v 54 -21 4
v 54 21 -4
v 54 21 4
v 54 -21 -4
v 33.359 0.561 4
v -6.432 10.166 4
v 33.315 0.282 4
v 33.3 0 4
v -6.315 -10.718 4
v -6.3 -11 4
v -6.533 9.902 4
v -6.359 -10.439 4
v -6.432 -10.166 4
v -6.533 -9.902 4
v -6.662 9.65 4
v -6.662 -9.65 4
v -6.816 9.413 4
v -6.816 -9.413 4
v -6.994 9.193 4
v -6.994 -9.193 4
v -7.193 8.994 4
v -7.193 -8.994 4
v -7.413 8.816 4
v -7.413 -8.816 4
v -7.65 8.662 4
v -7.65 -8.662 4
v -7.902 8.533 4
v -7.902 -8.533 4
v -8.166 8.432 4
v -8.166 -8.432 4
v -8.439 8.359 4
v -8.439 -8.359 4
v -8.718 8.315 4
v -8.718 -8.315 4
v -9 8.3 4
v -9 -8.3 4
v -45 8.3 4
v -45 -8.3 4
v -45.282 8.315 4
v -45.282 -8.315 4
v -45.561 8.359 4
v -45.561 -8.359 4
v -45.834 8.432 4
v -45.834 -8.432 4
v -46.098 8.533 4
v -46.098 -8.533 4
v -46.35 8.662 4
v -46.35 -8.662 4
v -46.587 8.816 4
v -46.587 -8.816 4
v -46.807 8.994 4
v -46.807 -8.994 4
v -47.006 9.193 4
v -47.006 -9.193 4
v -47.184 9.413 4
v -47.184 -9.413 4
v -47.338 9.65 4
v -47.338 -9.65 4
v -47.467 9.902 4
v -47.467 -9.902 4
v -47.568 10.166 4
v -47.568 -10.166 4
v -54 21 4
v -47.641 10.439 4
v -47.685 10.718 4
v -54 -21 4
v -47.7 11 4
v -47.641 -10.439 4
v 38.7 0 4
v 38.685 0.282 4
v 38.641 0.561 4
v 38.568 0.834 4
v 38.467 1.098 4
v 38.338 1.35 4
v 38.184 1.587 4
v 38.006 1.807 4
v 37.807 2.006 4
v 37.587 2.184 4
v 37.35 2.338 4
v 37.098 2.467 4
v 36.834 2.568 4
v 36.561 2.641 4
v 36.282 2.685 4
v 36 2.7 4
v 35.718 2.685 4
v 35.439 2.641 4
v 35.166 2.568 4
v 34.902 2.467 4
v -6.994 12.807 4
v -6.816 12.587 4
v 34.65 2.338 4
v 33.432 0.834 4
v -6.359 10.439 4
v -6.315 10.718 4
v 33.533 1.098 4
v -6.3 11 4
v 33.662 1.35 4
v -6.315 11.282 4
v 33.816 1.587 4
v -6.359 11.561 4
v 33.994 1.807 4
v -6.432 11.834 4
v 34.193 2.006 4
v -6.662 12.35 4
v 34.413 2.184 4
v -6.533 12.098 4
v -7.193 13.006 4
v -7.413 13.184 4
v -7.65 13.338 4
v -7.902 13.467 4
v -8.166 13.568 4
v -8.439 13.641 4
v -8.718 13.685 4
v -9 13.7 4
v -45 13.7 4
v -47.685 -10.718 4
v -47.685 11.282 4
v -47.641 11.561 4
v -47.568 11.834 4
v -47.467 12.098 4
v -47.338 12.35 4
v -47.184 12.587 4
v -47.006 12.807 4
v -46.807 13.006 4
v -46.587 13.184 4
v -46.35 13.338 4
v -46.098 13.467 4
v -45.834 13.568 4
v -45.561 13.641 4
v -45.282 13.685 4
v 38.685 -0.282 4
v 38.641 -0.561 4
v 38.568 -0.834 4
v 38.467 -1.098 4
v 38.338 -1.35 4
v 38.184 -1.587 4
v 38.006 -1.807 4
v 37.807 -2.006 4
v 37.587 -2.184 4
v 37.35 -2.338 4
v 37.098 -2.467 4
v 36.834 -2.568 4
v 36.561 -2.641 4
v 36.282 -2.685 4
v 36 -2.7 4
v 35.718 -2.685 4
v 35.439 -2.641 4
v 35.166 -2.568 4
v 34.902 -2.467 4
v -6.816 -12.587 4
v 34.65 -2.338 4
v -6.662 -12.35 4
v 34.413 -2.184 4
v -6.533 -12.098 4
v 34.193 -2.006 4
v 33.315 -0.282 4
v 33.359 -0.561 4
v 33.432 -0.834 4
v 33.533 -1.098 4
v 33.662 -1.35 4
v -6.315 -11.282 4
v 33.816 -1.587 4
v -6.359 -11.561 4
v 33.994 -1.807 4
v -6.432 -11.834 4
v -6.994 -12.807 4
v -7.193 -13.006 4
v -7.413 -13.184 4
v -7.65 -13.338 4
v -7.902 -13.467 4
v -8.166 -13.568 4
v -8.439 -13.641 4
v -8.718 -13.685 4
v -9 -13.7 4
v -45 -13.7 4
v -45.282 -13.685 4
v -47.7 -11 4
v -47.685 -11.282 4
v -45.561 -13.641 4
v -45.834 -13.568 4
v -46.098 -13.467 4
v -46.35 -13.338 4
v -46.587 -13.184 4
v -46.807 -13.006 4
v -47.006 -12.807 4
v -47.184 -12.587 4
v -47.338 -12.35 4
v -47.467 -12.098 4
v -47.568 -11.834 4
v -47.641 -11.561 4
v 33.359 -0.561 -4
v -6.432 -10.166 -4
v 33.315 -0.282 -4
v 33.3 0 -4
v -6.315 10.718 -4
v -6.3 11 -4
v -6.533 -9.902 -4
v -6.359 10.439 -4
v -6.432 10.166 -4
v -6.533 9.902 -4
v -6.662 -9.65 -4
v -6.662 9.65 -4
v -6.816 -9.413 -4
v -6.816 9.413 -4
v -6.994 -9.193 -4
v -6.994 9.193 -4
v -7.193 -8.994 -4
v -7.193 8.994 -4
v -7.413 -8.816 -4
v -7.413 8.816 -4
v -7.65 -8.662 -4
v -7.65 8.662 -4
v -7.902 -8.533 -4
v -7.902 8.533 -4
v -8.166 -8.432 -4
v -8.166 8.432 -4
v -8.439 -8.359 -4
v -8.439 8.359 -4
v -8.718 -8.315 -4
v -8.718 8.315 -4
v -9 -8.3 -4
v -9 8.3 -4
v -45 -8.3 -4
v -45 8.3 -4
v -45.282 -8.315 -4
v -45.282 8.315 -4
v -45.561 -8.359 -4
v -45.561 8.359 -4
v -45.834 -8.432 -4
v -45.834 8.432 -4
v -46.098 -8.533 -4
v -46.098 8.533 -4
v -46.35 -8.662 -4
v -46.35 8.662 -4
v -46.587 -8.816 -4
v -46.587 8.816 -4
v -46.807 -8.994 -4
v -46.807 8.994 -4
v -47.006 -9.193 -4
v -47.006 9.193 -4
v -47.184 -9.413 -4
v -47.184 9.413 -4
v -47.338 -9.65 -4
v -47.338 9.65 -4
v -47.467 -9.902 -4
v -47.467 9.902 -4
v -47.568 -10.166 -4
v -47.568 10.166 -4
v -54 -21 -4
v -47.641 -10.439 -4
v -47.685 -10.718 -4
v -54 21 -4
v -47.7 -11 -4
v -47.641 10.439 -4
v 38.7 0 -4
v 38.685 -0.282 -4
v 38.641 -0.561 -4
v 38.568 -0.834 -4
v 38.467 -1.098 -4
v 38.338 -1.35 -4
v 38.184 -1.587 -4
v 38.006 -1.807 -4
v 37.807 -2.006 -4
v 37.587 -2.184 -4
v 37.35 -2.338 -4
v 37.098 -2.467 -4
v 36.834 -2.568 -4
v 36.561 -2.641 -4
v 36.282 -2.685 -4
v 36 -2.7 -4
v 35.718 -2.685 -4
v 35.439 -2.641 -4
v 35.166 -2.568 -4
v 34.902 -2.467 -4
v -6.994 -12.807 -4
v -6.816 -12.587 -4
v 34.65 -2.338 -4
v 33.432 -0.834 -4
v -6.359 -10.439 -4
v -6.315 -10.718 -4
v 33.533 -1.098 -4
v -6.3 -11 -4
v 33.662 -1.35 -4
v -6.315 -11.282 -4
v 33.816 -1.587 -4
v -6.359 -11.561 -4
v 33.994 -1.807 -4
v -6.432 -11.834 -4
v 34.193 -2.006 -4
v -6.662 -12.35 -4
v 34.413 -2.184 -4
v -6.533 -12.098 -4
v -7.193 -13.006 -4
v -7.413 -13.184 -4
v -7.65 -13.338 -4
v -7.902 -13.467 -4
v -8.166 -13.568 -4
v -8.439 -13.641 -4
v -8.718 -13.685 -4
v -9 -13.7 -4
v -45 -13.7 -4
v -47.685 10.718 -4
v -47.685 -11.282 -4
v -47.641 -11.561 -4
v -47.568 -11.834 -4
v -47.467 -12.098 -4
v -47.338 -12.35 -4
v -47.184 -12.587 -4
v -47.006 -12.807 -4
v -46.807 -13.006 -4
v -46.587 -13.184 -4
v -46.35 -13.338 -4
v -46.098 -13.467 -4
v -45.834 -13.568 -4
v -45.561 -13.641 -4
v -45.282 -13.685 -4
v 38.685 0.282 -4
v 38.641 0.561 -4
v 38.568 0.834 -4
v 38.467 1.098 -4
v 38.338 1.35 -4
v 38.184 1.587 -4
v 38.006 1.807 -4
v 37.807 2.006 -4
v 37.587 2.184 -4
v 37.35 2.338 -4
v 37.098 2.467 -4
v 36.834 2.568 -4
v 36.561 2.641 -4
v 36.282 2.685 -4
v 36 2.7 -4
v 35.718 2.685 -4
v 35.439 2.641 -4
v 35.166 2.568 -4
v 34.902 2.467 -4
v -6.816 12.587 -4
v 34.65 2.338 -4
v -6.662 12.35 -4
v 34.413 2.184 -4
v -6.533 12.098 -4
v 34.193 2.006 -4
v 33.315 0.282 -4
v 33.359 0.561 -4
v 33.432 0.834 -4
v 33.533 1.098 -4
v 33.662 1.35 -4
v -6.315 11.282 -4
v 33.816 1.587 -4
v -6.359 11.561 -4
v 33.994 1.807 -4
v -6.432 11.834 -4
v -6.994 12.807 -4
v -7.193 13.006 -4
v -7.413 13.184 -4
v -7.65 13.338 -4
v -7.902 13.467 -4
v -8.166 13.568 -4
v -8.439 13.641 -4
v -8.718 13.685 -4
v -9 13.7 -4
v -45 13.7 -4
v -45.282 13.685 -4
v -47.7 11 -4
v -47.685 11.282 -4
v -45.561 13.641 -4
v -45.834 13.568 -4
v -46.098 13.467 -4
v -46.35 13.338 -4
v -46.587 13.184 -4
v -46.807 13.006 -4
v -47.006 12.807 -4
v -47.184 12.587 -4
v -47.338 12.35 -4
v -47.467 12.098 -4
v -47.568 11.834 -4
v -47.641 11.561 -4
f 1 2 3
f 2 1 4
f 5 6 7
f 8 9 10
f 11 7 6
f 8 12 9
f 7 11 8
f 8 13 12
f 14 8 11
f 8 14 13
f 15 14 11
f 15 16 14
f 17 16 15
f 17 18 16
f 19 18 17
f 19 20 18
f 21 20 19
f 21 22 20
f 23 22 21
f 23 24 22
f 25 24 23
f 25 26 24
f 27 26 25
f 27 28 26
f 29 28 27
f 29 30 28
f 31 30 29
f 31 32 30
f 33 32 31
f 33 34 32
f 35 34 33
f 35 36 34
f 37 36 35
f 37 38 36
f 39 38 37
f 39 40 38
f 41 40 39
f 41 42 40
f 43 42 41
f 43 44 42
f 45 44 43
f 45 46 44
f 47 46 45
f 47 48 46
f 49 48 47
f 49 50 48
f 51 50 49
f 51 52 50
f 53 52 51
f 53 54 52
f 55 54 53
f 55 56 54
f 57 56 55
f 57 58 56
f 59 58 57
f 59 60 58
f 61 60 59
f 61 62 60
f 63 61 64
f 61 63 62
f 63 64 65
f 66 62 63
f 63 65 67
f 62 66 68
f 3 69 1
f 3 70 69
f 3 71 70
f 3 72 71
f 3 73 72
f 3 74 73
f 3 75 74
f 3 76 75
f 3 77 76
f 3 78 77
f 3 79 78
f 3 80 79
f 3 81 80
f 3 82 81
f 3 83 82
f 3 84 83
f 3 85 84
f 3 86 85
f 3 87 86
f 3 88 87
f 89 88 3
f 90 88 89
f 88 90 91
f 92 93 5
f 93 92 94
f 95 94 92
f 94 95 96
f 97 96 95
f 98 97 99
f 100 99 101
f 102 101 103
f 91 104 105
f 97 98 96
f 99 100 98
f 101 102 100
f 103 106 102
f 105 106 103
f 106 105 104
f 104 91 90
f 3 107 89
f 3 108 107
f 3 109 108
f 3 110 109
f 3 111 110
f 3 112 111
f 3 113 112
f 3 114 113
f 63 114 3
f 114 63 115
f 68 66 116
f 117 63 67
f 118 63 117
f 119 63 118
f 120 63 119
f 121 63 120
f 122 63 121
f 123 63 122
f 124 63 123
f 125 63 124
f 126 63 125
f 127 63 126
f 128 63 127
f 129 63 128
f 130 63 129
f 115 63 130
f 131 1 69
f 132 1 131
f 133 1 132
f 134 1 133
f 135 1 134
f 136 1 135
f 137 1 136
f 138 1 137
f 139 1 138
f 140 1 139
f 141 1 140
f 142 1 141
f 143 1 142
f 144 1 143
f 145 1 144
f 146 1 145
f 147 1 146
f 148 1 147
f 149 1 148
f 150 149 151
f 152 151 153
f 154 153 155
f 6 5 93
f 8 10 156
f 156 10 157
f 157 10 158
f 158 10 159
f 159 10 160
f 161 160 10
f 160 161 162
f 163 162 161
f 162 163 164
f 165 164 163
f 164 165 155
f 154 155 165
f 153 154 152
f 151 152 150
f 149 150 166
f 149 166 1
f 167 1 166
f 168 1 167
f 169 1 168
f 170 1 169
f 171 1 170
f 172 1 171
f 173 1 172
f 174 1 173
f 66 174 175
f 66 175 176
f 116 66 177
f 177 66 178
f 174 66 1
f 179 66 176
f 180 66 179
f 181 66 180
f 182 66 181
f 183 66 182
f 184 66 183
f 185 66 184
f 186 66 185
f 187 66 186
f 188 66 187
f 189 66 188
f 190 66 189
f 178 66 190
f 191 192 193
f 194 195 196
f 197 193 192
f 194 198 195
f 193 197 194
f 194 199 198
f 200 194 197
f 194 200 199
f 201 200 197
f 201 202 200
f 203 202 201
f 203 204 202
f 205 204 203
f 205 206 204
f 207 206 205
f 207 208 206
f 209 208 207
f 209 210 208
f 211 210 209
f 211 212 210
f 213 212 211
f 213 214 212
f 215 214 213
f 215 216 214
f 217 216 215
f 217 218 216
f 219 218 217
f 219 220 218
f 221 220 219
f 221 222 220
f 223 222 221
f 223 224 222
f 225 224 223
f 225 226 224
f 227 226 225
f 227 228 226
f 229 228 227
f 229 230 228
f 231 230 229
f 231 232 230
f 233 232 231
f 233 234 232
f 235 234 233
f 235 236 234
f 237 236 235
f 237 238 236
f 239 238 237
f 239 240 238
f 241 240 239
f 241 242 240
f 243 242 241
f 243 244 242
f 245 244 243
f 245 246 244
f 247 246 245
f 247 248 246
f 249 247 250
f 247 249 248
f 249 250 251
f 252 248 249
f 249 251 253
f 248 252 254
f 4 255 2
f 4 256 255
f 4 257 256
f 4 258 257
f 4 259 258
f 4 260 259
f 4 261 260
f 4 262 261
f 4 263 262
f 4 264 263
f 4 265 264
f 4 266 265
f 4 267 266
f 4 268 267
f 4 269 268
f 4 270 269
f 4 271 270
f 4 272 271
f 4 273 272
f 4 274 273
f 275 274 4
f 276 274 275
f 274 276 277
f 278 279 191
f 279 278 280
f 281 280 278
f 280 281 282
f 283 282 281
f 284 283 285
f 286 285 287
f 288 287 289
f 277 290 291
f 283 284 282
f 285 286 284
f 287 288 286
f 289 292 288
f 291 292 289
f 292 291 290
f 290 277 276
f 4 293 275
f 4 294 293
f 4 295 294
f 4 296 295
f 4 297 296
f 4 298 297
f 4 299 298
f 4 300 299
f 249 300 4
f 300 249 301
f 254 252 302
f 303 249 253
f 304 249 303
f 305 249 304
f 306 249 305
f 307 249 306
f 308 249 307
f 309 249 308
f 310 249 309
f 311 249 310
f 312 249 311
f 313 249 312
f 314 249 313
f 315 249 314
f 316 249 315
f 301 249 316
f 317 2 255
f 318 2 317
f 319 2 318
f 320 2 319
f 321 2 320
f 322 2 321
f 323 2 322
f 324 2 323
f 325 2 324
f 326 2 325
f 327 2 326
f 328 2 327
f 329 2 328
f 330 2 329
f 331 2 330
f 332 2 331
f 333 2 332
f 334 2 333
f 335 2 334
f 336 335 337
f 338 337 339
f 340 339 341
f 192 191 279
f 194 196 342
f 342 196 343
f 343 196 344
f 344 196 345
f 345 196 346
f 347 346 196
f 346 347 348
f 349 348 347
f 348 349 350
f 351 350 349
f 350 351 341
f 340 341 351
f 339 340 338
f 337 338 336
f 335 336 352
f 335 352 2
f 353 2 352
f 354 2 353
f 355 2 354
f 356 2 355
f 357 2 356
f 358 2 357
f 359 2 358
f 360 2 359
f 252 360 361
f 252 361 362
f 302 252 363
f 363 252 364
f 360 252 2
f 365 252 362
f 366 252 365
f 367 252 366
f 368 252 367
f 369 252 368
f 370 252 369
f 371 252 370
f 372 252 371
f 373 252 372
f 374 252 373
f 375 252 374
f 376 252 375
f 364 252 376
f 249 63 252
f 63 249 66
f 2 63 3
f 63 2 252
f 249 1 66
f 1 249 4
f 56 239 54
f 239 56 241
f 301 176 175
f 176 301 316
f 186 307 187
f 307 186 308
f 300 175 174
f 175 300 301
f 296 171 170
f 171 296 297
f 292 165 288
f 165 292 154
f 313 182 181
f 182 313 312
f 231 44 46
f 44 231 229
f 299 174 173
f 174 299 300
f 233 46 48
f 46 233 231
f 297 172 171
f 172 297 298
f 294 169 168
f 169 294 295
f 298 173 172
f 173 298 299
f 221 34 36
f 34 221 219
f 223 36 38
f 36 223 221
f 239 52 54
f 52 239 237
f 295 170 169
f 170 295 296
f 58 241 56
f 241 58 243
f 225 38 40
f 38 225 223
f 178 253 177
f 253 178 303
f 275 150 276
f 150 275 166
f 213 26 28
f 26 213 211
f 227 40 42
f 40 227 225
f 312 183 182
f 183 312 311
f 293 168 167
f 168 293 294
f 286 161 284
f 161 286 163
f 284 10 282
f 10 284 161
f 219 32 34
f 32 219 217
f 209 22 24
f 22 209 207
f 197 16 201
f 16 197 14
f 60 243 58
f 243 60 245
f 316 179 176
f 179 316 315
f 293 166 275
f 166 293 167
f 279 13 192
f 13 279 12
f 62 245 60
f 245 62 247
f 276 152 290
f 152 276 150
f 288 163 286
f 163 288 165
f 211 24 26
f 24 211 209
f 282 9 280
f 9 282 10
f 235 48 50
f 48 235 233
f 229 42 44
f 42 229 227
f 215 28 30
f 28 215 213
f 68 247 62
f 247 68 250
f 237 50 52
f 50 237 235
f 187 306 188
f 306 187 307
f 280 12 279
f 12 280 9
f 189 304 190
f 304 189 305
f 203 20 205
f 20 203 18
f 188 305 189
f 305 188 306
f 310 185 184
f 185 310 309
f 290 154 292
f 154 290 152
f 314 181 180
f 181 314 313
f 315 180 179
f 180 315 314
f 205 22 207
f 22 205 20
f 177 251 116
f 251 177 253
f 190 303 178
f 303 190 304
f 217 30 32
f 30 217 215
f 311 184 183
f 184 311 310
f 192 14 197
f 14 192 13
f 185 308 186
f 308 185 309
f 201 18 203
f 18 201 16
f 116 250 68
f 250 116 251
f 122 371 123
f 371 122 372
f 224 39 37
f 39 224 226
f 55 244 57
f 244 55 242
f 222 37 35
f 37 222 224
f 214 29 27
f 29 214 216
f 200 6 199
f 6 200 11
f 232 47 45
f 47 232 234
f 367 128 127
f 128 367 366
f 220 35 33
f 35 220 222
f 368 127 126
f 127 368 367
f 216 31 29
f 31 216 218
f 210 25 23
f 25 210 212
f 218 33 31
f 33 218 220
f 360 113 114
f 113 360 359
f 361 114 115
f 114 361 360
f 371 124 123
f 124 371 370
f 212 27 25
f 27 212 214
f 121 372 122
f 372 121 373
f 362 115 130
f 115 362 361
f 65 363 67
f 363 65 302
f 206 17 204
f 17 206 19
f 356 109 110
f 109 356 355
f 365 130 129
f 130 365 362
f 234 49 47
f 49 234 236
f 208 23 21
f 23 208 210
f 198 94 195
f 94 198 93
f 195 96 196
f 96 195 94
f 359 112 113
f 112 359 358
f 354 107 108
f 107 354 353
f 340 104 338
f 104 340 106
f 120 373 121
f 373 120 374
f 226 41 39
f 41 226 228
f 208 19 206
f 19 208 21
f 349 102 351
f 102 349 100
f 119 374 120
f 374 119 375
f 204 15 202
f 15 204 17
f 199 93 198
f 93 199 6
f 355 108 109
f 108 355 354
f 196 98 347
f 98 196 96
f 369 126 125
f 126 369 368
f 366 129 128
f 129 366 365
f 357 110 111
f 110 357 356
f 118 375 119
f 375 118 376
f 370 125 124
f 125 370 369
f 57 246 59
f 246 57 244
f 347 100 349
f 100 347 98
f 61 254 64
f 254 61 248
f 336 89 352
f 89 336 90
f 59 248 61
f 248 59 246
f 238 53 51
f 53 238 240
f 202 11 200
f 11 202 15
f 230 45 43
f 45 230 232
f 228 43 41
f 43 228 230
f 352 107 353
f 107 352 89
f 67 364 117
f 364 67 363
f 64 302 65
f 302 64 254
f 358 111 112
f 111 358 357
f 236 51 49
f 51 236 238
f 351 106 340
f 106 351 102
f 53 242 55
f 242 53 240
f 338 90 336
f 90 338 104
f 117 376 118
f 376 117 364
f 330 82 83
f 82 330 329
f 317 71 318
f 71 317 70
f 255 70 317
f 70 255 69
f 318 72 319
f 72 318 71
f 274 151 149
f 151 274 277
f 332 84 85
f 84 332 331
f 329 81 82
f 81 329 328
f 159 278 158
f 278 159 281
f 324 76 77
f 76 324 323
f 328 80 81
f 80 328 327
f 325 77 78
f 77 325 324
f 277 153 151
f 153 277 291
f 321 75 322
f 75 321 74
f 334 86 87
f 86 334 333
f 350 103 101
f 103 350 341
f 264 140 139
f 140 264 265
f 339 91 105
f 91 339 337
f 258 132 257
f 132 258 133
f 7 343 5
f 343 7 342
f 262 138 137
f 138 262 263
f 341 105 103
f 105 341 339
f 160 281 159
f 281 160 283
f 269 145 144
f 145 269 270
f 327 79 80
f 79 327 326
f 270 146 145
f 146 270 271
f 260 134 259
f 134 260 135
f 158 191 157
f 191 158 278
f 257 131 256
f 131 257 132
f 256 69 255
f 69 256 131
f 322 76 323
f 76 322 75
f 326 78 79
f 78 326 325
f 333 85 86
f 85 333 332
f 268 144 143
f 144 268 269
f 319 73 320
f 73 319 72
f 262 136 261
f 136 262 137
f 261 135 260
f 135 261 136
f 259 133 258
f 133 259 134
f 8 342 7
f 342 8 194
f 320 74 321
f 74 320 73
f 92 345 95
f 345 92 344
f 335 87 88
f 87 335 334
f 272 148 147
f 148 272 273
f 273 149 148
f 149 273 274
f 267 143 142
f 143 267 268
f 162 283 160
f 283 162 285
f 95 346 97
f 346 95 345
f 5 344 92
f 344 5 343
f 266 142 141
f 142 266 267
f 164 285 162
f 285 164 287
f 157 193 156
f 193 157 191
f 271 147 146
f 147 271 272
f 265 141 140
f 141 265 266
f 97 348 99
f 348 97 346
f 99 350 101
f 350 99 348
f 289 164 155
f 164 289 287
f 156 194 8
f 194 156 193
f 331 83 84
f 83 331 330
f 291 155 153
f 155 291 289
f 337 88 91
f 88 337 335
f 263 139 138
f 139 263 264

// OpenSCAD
// GT2 idler tensioner slide for 12 mm belt.
$fn = 60;
eps = 0.02;
slide_l = 108;
slide_w = 42;
slide_t = 8;
belt_w = 12;
slot_l = 36;
axle_d = 5.4;
axle_x = slide_l / 2 - 18;
module slot(y) {
    hull() {
        translate([-slide_l / 4 - slot_l / 2, y, -slide_t / 2 - eps]) cylinder(d = 5.4, h = slide_t + 2 * eps);
        translate([-slide_l / 4 + slot_l / 2, y, -slide_t / 2 - eps]) cylinder(d = 5.4, h = slide_t + 2 * eps);
    }
}
difference() {
    cube([slide_l, slide_w, slide_t], center = true);
    slot(-11);
    slot(11);
    translate([axle_x, 0, -slide_t / 2 - eps]) cylinder(d = axle_d, h = slide_t + 2 * eps);
}
